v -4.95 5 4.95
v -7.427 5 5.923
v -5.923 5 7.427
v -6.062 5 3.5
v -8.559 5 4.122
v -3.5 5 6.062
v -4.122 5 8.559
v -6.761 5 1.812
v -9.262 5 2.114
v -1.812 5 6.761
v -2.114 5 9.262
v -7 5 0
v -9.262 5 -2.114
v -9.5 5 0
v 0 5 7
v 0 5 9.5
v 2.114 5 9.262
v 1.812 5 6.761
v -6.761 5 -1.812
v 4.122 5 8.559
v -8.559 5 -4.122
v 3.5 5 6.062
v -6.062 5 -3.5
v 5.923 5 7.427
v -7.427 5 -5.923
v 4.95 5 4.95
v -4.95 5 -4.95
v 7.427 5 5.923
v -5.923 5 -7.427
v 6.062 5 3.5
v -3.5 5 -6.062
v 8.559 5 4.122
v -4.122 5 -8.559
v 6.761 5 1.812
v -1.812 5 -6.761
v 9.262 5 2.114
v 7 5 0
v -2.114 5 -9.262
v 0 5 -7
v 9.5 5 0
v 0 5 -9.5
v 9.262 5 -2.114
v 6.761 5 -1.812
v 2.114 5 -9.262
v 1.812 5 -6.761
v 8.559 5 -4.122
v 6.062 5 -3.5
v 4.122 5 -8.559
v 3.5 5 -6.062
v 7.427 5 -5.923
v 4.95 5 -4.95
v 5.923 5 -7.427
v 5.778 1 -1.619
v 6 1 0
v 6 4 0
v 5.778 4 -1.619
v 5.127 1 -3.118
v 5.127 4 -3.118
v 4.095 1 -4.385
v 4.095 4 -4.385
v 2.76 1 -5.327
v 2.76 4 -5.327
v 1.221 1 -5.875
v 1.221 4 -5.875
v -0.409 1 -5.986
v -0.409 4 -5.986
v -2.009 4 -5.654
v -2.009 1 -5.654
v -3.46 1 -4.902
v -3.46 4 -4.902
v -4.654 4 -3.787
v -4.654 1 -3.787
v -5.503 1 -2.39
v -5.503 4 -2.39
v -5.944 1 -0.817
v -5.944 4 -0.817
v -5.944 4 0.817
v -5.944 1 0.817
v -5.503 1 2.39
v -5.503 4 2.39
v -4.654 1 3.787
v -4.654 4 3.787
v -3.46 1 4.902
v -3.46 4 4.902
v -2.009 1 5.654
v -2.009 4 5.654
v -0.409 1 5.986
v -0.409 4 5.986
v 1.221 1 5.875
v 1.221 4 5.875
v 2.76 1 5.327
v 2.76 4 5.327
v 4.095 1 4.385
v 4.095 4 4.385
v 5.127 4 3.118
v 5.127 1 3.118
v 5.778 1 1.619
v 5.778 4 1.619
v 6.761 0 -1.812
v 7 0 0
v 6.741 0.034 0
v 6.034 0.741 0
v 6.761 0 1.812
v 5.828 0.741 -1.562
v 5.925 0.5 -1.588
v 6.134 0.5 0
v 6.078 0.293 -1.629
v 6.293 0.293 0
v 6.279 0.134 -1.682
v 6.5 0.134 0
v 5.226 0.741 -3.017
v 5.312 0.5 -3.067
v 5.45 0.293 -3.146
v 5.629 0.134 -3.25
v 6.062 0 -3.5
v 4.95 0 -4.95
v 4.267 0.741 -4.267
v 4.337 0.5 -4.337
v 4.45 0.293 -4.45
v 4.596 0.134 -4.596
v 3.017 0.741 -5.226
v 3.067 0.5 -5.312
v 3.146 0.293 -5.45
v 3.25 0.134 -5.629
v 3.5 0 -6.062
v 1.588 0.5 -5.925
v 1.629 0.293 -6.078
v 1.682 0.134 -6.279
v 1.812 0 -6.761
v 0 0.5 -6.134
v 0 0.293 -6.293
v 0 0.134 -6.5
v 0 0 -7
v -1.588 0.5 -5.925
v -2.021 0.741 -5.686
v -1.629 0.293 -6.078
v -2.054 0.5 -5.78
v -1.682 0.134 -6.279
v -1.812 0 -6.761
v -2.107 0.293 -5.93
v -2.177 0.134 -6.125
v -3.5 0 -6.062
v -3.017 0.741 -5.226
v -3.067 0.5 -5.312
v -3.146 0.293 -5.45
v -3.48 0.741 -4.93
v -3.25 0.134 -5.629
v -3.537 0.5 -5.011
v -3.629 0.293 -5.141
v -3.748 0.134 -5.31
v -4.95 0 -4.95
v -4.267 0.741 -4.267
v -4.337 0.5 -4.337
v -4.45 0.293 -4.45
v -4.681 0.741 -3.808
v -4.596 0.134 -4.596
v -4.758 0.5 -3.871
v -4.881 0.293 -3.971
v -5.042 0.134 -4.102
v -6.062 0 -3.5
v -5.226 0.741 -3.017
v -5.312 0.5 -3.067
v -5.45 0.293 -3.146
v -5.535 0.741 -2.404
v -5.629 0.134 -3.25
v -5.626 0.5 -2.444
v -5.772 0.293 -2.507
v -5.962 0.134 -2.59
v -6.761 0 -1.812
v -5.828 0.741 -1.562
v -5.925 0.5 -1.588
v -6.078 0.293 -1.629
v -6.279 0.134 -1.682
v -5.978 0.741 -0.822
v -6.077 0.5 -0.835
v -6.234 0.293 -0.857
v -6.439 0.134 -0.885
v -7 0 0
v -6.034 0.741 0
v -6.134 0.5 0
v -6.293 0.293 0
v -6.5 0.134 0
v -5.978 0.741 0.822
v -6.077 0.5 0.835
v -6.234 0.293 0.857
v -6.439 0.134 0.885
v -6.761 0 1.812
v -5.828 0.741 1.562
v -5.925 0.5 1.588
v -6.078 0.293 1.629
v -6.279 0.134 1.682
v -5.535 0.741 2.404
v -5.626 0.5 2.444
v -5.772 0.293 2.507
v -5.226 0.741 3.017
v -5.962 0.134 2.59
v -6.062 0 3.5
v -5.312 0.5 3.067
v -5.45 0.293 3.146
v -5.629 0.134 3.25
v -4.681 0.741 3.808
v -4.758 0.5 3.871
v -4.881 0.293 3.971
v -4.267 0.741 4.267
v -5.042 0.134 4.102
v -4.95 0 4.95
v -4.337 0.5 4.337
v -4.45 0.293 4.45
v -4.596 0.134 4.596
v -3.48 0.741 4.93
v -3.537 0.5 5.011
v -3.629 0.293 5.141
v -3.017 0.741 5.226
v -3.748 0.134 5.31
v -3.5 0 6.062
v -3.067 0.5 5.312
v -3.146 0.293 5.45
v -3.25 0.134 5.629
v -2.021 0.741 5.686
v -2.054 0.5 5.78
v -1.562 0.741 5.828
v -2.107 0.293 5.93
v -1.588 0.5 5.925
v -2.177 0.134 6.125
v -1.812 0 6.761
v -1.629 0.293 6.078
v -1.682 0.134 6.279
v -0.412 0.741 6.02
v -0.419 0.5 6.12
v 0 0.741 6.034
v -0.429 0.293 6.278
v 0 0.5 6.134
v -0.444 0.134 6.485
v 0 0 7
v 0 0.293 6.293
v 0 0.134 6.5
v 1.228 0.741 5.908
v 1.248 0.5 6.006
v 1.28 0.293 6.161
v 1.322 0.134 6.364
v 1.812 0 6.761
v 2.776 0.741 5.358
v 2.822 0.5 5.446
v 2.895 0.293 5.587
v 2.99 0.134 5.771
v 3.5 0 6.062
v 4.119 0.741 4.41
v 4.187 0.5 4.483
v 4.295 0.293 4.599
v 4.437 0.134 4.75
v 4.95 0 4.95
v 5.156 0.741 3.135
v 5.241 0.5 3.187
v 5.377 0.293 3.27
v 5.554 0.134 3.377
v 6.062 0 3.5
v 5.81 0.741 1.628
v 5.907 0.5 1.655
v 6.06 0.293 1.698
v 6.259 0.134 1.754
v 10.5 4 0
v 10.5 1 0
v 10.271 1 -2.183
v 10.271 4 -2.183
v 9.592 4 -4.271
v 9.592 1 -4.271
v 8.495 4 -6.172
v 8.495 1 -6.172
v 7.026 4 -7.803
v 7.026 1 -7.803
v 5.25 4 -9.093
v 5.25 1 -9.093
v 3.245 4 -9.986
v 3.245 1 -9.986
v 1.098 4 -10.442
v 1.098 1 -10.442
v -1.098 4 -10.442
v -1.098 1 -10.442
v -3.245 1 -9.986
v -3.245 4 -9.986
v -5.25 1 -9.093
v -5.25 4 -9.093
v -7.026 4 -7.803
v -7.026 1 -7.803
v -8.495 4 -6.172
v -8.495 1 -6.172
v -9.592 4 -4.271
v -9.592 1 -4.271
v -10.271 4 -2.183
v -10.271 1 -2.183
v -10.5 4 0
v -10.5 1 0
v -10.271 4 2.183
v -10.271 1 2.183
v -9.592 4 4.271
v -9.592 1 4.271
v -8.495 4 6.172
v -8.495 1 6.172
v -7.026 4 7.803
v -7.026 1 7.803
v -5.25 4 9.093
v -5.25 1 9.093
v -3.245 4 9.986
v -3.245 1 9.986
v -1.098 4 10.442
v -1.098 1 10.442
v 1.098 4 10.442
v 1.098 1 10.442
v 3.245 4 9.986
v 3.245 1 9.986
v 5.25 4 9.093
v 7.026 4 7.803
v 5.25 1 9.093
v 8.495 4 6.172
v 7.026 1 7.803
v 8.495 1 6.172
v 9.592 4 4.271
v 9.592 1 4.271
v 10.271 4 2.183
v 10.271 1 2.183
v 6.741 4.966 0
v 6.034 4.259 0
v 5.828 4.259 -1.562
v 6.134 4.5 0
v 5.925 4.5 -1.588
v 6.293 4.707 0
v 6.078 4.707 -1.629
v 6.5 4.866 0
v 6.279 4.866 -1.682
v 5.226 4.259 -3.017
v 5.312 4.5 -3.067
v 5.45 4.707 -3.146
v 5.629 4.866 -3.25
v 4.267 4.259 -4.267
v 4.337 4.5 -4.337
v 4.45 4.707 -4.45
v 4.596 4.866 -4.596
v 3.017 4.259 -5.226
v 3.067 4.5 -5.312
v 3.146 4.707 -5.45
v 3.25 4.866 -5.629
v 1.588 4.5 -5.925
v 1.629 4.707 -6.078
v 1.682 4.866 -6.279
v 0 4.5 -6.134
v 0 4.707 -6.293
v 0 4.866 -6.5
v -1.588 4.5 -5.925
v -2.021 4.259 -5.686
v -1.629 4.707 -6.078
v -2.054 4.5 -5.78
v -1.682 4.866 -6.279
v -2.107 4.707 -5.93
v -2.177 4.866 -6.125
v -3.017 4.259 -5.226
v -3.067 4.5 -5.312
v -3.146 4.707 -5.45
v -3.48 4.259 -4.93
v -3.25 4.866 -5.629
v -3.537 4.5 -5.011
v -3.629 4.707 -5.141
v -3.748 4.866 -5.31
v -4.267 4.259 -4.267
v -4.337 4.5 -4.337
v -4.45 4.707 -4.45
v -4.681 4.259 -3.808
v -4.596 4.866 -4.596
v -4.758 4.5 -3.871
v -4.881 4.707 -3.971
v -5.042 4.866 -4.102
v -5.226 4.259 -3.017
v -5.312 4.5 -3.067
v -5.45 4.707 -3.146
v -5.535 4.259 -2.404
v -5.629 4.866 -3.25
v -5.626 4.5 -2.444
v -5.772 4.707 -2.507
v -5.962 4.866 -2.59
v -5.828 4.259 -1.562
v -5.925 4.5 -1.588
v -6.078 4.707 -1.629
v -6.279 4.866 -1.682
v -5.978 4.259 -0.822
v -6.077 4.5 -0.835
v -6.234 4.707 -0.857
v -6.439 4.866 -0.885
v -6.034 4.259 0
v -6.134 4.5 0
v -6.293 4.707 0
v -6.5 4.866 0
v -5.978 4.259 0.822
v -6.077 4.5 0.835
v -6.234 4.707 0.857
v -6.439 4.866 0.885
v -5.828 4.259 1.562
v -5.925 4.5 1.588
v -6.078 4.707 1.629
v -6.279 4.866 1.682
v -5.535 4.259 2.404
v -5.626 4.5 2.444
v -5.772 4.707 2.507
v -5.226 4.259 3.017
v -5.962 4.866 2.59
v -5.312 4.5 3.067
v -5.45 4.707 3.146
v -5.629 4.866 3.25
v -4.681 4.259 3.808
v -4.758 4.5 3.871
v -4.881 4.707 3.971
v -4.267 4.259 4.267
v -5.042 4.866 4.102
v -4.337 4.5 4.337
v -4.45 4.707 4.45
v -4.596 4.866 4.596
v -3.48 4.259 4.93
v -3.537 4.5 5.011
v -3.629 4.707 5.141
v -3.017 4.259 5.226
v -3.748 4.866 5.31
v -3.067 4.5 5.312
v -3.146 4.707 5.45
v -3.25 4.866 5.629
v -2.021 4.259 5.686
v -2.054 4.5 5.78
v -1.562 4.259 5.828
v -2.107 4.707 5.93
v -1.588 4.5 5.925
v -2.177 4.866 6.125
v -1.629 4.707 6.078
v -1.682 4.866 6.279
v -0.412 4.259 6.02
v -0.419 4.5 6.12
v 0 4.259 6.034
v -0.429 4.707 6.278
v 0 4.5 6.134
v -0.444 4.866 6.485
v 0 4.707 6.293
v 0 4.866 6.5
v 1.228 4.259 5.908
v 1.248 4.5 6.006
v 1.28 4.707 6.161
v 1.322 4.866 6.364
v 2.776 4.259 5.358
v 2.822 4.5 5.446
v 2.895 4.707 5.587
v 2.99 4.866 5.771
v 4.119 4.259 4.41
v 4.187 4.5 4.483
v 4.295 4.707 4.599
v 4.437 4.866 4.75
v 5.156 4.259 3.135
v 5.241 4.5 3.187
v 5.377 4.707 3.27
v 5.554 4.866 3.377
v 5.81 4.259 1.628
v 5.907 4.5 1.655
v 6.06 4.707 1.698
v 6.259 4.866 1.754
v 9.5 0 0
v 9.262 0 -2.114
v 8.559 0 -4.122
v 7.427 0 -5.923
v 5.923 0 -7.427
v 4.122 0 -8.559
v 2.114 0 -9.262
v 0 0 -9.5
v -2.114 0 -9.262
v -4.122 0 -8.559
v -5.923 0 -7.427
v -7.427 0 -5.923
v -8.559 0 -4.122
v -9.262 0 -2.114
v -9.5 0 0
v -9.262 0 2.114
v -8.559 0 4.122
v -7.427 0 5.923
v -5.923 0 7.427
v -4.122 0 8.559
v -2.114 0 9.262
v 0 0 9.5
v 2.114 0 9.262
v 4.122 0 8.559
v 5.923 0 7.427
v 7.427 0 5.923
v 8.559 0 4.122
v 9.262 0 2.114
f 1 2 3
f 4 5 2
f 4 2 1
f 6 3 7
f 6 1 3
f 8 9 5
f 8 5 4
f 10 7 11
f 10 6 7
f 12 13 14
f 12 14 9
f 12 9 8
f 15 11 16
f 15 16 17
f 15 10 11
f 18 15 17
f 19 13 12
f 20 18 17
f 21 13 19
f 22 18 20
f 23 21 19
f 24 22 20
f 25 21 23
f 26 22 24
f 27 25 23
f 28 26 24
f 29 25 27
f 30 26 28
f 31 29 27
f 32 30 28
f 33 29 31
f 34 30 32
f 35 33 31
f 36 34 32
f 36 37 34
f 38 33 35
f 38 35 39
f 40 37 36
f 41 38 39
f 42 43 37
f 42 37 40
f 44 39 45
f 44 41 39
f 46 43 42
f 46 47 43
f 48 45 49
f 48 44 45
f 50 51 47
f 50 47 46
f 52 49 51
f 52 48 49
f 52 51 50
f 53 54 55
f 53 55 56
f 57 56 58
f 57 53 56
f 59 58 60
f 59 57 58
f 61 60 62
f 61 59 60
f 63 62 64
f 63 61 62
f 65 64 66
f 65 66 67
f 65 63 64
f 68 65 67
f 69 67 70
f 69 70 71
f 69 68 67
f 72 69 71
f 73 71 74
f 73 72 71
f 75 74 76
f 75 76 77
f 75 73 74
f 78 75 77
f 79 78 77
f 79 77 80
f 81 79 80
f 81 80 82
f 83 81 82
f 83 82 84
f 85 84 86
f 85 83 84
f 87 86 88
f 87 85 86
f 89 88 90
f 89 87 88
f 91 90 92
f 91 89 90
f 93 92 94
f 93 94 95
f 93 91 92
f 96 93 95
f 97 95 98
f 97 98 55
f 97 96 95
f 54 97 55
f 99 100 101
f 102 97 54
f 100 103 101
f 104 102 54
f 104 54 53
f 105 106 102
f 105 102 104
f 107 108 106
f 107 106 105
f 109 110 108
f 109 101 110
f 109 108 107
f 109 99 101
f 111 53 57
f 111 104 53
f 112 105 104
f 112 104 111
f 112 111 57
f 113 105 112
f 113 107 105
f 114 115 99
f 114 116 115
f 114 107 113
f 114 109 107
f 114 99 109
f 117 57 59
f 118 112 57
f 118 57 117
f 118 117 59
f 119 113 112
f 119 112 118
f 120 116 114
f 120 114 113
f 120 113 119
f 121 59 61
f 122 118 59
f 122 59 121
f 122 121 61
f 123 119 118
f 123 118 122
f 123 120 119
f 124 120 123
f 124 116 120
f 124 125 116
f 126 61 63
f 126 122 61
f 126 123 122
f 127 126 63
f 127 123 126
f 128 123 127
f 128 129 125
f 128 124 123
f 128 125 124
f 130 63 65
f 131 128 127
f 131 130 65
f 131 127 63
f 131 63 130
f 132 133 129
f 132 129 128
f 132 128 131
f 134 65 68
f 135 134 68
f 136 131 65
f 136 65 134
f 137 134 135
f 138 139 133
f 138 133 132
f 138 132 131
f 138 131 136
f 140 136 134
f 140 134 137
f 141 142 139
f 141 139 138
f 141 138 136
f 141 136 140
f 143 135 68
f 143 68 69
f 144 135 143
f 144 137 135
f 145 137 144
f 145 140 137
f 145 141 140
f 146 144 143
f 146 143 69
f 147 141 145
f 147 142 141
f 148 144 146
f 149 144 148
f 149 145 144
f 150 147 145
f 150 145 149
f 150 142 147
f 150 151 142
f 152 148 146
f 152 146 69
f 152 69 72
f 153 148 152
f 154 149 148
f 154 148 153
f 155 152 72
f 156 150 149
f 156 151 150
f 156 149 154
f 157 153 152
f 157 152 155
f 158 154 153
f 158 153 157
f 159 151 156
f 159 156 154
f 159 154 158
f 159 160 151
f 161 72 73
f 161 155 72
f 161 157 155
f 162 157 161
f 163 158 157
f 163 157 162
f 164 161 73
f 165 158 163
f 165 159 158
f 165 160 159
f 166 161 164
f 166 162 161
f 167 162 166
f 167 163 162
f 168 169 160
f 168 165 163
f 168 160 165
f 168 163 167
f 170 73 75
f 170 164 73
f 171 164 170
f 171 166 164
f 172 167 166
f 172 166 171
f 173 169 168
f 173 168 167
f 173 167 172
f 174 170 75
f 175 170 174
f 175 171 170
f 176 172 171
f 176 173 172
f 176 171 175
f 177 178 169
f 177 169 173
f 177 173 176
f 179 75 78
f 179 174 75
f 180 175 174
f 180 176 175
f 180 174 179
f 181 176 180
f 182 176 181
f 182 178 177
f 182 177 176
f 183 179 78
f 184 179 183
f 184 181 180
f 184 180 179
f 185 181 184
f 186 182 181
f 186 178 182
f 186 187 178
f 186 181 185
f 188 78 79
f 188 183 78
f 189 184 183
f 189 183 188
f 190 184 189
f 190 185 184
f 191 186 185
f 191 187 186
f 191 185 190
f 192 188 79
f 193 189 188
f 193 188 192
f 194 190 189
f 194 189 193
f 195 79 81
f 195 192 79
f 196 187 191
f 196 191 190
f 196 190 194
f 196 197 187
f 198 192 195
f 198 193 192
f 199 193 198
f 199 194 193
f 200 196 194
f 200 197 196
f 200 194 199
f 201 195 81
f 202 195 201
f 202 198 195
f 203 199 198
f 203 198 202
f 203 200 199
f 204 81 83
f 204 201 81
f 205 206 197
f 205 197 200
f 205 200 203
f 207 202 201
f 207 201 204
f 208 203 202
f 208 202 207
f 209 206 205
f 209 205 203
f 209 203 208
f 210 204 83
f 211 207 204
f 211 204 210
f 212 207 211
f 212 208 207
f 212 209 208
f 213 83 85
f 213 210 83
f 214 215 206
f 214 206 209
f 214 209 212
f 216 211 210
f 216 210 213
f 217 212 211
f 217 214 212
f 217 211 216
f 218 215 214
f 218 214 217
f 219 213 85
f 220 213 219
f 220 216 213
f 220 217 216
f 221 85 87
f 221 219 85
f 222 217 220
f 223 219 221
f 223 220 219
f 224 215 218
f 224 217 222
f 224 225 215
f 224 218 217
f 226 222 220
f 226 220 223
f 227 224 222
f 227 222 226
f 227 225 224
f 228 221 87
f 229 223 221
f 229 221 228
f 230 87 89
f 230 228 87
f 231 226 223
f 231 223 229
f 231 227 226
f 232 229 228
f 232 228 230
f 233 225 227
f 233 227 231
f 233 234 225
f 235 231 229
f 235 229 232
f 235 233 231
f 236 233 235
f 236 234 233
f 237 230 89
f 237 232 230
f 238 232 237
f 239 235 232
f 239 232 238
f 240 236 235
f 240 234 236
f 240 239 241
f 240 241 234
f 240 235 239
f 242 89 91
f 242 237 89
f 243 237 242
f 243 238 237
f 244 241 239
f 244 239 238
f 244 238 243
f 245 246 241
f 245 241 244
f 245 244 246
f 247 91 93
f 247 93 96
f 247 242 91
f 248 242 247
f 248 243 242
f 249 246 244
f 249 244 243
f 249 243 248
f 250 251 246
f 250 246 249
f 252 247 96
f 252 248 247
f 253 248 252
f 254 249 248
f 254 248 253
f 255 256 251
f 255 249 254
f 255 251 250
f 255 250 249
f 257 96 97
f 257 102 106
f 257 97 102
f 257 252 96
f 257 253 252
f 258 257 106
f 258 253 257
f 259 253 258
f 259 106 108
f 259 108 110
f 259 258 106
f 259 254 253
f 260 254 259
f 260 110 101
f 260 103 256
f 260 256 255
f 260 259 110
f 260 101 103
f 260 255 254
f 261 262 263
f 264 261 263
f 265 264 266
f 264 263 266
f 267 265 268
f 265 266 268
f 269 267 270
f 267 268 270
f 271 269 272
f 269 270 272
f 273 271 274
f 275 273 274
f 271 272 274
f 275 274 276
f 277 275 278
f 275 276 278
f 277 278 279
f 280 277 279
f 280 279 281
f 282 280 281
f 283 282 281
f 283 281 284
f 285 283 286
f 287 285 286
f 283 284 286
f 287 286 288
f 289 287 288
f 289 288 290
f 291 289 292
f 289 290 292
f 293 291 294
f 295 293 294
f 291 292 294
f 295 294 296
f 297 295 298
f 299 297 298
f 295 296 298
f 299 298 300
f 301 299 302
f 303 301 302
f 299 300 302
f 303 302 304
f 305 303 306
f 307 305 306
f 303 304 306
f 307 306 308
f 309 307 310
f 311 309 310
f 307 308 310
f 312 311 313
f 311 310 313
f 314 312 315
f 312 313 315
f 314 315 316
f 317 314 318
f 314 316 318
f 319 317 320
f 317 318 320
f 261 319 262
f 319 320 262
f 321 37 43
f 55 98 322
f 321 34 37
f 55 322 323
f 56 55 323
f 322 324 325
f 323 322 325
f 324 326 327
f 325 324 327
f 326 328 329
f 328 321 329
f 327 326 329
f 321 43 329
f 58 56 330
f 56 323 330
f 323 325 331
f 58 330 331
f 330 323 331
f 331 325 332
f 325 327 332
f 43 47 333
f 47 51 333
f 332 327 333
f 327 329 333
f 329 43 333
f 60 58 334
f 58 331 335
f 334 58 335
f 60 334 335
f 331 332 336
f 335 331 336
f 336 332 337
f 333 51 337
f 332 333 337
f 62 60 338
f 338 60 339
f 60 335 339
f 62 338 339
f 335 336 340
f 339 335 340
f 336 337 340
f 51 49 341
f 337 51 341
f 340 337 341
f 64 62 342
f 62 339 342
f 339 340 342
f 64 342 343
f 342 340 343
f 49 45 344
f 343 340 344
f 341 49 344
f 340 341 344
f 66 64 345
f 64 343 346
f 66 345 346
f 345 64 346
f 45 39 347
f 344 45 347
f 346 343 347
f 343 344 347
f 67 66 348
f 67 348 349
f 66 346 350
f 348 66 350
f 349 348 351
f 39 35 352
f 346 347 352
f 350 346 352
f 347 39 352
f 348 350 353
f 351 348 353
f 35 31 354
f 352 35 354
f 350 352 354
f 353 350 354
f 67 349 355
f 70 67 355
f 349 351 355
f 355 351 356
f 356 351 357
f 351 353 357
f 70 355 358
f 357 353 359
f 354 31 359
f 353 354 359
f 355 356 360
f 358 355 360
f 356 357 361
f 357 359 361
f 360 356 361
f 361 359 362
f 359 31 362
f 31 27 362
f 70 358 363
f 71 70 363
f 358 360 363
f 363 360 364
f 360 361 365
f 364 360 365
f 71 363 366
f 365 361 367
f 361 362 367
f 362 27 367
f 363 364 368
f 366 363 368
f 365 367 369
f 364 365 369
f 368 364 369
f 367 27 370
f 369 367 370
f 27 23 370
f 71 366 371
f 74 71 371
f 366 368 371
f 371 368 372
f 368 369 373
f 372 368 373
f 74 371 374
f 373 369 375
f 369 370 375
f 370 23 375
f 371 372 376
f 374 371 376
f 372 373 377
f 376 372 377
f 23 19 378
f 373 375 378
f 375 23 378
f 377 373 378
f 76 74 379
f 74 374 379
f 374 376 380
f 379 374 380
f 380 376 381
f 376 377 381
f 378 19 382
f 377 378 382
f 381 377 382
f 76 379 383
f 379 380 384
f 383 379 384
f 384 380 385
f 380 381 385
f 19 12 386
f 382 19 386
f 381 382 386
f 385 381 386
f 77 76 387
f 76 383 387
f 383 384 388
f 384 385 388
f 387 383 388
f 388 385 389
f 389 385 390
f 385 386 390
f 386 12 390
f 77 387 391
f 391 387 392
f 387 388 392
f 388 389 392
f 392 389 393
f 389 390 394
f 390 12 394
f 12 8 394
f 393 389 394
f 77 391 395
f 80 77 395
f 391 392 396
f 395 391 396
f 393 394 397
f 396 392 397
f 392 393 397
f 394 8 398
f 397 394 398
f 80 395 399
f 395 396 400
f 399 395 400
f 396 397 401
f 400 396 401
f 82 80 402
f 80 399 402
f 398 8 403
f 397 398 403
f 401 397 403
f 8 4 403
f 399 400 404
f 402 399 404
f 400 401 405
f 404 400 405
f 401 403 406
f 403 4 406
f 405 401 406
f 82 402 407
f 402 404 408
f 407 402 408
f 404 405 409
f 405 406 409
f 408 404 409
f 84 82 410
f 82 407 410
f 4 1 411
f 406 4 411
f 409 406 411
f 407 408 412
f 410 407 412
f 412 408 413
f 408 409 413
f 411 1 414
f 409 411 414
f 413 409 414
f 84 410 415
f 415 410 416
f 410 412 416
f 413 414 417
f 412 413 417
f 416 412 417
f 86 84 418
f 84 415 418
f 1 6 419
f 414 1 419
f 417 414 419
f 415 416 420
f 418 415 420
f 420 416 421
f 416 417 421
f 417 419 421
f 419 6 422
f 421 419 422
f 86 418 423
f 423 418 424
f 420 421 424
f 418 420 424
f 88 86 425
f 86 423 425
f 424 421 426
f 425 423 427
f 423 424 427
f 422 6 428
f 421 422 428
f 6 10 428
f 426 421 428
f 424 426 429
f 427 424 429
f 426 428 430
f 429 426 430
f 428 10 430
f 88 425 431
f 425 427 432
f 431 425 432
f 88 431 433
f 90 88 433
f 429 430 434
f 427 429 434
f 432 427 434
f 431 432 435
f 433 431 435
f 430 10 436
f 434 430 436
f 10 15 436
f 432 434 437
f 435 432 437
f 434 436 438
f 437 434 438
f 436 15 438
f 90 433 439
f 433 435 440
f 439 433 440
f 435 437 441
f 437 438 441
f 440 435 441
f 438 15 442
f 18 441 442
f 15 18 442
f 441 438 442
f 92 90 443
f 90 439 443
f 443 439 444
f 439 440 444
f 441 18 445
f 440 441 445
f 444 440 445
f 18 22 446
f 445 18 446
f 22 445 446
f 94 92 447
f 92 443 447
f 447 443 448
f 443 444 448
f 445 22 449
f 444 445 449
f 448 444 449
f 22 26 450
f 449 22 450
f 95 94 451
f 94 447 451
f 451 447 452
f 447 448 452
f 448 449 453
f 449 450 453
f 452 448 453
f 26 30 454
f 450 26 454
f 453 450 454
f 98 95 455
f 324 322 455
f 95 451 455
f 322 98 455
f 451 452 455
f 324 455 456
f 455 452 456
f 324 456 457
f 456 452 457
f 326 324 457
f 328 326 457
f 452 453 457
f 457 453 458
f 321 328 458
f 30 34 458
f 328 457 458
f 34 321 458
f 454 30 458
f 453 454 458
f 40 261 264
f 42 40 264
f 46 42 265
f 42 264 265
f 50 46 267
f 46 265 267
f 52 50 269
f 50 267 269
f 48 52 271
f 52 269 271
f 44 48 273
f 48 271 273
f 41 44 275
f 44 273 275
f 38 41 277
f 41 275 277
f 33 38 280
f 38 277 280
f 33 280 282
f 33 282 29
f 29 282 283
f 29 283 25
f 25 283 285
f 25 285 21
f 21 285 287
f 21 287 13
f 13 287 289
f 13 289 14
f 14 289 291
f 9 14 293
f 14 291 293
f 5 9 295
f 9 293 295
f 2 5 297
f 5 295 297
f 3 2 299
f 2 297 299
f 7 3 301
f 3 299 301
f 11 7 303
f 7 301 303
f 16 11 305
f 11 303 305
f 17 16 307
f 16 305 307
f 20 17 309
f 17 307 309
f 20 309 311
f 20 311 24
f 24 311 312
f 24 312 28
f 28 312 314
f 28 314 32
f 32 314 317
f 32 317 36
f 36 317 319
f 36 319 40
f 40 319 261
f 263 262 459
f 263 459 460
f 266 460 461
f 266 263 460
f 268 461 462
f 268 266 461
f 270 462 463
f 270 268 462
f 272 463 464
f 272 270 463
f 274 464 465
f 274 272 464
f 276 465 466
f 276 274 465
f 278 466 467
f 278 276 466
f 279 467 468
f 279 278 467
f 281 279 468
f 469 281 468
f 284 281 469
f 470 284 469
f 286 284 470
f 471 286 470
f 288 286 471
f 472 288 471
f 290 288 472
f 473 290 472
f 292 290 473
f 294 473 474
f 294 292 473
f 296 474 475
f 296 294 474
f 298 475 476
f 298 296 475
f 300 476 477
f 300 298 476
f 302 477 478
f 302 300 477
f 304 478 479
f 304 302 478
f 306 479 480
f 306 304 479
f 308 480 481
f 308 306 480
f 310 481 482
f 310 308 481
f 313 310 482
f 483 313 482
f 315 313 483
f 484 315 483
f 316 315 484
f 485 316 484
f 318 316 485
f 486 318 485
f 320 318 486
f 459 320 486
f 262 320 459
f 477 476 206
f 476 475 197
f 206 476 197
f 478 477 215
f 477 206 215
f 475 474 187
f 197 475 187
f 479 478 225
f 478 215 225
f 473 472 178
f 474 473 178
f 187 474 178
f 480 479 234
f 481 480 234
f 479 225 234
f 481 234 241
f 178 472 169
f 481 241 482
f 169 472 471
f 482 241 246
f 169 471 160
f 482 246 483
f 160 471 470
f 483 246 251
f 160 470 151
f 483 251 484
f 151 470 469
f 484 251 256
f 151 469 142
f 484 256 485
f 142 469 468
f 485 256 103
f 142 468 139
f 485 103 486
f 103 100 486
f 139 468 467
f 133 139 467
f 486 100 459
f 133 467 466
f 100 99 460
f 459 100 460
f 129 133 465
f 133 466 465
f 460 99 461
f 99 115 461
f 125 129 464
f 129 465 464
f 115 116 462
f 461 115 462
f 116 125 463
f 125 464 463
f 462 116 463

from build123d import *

# Parameters (mm, degrees)
SKETCH_1_R      = 10.5
SKETCH_1_R_2    = 6
EXTRUDE_1_DEPTH = 5
FILLET_1_R      = 1
CHAMFER_1_SIZE  = 1


with BuildPart() as part:
    # Эскиз1 → Бобышка-Вытянуть1 (new body)
    with BuildSketch(Plane(origin=(0, 0, 0), x_dir=(1, 0, 0), z_dir=(0, 1, 0))):
        Circle(SKETCH_1_R)
        Circle(SKETCH_1_R_2, mode=Mode.SUBTRACT)
    extrude(amount=EXTRUDE_1_DEPTH)

    # Скругление1
    fillet_1_edges = [part.edges().sort_by_distance(p)[0] for p in [
        (-6, 0, 0),
        (-6, 5, 0),
    ]]
    fillet(fillet_1_edges, radius=FILLET_1_R)

    # Фаска1
    chamfer_1_edges = [part.edges().sort_by_distance(p)[0] for p in [
        (-10.5, 0, 0),
        (-10.5, 5, 0),
    ]]
    chamfer(chamfer_1_edges, length=CHAMFER_1_SIZE)


solid = part.part
